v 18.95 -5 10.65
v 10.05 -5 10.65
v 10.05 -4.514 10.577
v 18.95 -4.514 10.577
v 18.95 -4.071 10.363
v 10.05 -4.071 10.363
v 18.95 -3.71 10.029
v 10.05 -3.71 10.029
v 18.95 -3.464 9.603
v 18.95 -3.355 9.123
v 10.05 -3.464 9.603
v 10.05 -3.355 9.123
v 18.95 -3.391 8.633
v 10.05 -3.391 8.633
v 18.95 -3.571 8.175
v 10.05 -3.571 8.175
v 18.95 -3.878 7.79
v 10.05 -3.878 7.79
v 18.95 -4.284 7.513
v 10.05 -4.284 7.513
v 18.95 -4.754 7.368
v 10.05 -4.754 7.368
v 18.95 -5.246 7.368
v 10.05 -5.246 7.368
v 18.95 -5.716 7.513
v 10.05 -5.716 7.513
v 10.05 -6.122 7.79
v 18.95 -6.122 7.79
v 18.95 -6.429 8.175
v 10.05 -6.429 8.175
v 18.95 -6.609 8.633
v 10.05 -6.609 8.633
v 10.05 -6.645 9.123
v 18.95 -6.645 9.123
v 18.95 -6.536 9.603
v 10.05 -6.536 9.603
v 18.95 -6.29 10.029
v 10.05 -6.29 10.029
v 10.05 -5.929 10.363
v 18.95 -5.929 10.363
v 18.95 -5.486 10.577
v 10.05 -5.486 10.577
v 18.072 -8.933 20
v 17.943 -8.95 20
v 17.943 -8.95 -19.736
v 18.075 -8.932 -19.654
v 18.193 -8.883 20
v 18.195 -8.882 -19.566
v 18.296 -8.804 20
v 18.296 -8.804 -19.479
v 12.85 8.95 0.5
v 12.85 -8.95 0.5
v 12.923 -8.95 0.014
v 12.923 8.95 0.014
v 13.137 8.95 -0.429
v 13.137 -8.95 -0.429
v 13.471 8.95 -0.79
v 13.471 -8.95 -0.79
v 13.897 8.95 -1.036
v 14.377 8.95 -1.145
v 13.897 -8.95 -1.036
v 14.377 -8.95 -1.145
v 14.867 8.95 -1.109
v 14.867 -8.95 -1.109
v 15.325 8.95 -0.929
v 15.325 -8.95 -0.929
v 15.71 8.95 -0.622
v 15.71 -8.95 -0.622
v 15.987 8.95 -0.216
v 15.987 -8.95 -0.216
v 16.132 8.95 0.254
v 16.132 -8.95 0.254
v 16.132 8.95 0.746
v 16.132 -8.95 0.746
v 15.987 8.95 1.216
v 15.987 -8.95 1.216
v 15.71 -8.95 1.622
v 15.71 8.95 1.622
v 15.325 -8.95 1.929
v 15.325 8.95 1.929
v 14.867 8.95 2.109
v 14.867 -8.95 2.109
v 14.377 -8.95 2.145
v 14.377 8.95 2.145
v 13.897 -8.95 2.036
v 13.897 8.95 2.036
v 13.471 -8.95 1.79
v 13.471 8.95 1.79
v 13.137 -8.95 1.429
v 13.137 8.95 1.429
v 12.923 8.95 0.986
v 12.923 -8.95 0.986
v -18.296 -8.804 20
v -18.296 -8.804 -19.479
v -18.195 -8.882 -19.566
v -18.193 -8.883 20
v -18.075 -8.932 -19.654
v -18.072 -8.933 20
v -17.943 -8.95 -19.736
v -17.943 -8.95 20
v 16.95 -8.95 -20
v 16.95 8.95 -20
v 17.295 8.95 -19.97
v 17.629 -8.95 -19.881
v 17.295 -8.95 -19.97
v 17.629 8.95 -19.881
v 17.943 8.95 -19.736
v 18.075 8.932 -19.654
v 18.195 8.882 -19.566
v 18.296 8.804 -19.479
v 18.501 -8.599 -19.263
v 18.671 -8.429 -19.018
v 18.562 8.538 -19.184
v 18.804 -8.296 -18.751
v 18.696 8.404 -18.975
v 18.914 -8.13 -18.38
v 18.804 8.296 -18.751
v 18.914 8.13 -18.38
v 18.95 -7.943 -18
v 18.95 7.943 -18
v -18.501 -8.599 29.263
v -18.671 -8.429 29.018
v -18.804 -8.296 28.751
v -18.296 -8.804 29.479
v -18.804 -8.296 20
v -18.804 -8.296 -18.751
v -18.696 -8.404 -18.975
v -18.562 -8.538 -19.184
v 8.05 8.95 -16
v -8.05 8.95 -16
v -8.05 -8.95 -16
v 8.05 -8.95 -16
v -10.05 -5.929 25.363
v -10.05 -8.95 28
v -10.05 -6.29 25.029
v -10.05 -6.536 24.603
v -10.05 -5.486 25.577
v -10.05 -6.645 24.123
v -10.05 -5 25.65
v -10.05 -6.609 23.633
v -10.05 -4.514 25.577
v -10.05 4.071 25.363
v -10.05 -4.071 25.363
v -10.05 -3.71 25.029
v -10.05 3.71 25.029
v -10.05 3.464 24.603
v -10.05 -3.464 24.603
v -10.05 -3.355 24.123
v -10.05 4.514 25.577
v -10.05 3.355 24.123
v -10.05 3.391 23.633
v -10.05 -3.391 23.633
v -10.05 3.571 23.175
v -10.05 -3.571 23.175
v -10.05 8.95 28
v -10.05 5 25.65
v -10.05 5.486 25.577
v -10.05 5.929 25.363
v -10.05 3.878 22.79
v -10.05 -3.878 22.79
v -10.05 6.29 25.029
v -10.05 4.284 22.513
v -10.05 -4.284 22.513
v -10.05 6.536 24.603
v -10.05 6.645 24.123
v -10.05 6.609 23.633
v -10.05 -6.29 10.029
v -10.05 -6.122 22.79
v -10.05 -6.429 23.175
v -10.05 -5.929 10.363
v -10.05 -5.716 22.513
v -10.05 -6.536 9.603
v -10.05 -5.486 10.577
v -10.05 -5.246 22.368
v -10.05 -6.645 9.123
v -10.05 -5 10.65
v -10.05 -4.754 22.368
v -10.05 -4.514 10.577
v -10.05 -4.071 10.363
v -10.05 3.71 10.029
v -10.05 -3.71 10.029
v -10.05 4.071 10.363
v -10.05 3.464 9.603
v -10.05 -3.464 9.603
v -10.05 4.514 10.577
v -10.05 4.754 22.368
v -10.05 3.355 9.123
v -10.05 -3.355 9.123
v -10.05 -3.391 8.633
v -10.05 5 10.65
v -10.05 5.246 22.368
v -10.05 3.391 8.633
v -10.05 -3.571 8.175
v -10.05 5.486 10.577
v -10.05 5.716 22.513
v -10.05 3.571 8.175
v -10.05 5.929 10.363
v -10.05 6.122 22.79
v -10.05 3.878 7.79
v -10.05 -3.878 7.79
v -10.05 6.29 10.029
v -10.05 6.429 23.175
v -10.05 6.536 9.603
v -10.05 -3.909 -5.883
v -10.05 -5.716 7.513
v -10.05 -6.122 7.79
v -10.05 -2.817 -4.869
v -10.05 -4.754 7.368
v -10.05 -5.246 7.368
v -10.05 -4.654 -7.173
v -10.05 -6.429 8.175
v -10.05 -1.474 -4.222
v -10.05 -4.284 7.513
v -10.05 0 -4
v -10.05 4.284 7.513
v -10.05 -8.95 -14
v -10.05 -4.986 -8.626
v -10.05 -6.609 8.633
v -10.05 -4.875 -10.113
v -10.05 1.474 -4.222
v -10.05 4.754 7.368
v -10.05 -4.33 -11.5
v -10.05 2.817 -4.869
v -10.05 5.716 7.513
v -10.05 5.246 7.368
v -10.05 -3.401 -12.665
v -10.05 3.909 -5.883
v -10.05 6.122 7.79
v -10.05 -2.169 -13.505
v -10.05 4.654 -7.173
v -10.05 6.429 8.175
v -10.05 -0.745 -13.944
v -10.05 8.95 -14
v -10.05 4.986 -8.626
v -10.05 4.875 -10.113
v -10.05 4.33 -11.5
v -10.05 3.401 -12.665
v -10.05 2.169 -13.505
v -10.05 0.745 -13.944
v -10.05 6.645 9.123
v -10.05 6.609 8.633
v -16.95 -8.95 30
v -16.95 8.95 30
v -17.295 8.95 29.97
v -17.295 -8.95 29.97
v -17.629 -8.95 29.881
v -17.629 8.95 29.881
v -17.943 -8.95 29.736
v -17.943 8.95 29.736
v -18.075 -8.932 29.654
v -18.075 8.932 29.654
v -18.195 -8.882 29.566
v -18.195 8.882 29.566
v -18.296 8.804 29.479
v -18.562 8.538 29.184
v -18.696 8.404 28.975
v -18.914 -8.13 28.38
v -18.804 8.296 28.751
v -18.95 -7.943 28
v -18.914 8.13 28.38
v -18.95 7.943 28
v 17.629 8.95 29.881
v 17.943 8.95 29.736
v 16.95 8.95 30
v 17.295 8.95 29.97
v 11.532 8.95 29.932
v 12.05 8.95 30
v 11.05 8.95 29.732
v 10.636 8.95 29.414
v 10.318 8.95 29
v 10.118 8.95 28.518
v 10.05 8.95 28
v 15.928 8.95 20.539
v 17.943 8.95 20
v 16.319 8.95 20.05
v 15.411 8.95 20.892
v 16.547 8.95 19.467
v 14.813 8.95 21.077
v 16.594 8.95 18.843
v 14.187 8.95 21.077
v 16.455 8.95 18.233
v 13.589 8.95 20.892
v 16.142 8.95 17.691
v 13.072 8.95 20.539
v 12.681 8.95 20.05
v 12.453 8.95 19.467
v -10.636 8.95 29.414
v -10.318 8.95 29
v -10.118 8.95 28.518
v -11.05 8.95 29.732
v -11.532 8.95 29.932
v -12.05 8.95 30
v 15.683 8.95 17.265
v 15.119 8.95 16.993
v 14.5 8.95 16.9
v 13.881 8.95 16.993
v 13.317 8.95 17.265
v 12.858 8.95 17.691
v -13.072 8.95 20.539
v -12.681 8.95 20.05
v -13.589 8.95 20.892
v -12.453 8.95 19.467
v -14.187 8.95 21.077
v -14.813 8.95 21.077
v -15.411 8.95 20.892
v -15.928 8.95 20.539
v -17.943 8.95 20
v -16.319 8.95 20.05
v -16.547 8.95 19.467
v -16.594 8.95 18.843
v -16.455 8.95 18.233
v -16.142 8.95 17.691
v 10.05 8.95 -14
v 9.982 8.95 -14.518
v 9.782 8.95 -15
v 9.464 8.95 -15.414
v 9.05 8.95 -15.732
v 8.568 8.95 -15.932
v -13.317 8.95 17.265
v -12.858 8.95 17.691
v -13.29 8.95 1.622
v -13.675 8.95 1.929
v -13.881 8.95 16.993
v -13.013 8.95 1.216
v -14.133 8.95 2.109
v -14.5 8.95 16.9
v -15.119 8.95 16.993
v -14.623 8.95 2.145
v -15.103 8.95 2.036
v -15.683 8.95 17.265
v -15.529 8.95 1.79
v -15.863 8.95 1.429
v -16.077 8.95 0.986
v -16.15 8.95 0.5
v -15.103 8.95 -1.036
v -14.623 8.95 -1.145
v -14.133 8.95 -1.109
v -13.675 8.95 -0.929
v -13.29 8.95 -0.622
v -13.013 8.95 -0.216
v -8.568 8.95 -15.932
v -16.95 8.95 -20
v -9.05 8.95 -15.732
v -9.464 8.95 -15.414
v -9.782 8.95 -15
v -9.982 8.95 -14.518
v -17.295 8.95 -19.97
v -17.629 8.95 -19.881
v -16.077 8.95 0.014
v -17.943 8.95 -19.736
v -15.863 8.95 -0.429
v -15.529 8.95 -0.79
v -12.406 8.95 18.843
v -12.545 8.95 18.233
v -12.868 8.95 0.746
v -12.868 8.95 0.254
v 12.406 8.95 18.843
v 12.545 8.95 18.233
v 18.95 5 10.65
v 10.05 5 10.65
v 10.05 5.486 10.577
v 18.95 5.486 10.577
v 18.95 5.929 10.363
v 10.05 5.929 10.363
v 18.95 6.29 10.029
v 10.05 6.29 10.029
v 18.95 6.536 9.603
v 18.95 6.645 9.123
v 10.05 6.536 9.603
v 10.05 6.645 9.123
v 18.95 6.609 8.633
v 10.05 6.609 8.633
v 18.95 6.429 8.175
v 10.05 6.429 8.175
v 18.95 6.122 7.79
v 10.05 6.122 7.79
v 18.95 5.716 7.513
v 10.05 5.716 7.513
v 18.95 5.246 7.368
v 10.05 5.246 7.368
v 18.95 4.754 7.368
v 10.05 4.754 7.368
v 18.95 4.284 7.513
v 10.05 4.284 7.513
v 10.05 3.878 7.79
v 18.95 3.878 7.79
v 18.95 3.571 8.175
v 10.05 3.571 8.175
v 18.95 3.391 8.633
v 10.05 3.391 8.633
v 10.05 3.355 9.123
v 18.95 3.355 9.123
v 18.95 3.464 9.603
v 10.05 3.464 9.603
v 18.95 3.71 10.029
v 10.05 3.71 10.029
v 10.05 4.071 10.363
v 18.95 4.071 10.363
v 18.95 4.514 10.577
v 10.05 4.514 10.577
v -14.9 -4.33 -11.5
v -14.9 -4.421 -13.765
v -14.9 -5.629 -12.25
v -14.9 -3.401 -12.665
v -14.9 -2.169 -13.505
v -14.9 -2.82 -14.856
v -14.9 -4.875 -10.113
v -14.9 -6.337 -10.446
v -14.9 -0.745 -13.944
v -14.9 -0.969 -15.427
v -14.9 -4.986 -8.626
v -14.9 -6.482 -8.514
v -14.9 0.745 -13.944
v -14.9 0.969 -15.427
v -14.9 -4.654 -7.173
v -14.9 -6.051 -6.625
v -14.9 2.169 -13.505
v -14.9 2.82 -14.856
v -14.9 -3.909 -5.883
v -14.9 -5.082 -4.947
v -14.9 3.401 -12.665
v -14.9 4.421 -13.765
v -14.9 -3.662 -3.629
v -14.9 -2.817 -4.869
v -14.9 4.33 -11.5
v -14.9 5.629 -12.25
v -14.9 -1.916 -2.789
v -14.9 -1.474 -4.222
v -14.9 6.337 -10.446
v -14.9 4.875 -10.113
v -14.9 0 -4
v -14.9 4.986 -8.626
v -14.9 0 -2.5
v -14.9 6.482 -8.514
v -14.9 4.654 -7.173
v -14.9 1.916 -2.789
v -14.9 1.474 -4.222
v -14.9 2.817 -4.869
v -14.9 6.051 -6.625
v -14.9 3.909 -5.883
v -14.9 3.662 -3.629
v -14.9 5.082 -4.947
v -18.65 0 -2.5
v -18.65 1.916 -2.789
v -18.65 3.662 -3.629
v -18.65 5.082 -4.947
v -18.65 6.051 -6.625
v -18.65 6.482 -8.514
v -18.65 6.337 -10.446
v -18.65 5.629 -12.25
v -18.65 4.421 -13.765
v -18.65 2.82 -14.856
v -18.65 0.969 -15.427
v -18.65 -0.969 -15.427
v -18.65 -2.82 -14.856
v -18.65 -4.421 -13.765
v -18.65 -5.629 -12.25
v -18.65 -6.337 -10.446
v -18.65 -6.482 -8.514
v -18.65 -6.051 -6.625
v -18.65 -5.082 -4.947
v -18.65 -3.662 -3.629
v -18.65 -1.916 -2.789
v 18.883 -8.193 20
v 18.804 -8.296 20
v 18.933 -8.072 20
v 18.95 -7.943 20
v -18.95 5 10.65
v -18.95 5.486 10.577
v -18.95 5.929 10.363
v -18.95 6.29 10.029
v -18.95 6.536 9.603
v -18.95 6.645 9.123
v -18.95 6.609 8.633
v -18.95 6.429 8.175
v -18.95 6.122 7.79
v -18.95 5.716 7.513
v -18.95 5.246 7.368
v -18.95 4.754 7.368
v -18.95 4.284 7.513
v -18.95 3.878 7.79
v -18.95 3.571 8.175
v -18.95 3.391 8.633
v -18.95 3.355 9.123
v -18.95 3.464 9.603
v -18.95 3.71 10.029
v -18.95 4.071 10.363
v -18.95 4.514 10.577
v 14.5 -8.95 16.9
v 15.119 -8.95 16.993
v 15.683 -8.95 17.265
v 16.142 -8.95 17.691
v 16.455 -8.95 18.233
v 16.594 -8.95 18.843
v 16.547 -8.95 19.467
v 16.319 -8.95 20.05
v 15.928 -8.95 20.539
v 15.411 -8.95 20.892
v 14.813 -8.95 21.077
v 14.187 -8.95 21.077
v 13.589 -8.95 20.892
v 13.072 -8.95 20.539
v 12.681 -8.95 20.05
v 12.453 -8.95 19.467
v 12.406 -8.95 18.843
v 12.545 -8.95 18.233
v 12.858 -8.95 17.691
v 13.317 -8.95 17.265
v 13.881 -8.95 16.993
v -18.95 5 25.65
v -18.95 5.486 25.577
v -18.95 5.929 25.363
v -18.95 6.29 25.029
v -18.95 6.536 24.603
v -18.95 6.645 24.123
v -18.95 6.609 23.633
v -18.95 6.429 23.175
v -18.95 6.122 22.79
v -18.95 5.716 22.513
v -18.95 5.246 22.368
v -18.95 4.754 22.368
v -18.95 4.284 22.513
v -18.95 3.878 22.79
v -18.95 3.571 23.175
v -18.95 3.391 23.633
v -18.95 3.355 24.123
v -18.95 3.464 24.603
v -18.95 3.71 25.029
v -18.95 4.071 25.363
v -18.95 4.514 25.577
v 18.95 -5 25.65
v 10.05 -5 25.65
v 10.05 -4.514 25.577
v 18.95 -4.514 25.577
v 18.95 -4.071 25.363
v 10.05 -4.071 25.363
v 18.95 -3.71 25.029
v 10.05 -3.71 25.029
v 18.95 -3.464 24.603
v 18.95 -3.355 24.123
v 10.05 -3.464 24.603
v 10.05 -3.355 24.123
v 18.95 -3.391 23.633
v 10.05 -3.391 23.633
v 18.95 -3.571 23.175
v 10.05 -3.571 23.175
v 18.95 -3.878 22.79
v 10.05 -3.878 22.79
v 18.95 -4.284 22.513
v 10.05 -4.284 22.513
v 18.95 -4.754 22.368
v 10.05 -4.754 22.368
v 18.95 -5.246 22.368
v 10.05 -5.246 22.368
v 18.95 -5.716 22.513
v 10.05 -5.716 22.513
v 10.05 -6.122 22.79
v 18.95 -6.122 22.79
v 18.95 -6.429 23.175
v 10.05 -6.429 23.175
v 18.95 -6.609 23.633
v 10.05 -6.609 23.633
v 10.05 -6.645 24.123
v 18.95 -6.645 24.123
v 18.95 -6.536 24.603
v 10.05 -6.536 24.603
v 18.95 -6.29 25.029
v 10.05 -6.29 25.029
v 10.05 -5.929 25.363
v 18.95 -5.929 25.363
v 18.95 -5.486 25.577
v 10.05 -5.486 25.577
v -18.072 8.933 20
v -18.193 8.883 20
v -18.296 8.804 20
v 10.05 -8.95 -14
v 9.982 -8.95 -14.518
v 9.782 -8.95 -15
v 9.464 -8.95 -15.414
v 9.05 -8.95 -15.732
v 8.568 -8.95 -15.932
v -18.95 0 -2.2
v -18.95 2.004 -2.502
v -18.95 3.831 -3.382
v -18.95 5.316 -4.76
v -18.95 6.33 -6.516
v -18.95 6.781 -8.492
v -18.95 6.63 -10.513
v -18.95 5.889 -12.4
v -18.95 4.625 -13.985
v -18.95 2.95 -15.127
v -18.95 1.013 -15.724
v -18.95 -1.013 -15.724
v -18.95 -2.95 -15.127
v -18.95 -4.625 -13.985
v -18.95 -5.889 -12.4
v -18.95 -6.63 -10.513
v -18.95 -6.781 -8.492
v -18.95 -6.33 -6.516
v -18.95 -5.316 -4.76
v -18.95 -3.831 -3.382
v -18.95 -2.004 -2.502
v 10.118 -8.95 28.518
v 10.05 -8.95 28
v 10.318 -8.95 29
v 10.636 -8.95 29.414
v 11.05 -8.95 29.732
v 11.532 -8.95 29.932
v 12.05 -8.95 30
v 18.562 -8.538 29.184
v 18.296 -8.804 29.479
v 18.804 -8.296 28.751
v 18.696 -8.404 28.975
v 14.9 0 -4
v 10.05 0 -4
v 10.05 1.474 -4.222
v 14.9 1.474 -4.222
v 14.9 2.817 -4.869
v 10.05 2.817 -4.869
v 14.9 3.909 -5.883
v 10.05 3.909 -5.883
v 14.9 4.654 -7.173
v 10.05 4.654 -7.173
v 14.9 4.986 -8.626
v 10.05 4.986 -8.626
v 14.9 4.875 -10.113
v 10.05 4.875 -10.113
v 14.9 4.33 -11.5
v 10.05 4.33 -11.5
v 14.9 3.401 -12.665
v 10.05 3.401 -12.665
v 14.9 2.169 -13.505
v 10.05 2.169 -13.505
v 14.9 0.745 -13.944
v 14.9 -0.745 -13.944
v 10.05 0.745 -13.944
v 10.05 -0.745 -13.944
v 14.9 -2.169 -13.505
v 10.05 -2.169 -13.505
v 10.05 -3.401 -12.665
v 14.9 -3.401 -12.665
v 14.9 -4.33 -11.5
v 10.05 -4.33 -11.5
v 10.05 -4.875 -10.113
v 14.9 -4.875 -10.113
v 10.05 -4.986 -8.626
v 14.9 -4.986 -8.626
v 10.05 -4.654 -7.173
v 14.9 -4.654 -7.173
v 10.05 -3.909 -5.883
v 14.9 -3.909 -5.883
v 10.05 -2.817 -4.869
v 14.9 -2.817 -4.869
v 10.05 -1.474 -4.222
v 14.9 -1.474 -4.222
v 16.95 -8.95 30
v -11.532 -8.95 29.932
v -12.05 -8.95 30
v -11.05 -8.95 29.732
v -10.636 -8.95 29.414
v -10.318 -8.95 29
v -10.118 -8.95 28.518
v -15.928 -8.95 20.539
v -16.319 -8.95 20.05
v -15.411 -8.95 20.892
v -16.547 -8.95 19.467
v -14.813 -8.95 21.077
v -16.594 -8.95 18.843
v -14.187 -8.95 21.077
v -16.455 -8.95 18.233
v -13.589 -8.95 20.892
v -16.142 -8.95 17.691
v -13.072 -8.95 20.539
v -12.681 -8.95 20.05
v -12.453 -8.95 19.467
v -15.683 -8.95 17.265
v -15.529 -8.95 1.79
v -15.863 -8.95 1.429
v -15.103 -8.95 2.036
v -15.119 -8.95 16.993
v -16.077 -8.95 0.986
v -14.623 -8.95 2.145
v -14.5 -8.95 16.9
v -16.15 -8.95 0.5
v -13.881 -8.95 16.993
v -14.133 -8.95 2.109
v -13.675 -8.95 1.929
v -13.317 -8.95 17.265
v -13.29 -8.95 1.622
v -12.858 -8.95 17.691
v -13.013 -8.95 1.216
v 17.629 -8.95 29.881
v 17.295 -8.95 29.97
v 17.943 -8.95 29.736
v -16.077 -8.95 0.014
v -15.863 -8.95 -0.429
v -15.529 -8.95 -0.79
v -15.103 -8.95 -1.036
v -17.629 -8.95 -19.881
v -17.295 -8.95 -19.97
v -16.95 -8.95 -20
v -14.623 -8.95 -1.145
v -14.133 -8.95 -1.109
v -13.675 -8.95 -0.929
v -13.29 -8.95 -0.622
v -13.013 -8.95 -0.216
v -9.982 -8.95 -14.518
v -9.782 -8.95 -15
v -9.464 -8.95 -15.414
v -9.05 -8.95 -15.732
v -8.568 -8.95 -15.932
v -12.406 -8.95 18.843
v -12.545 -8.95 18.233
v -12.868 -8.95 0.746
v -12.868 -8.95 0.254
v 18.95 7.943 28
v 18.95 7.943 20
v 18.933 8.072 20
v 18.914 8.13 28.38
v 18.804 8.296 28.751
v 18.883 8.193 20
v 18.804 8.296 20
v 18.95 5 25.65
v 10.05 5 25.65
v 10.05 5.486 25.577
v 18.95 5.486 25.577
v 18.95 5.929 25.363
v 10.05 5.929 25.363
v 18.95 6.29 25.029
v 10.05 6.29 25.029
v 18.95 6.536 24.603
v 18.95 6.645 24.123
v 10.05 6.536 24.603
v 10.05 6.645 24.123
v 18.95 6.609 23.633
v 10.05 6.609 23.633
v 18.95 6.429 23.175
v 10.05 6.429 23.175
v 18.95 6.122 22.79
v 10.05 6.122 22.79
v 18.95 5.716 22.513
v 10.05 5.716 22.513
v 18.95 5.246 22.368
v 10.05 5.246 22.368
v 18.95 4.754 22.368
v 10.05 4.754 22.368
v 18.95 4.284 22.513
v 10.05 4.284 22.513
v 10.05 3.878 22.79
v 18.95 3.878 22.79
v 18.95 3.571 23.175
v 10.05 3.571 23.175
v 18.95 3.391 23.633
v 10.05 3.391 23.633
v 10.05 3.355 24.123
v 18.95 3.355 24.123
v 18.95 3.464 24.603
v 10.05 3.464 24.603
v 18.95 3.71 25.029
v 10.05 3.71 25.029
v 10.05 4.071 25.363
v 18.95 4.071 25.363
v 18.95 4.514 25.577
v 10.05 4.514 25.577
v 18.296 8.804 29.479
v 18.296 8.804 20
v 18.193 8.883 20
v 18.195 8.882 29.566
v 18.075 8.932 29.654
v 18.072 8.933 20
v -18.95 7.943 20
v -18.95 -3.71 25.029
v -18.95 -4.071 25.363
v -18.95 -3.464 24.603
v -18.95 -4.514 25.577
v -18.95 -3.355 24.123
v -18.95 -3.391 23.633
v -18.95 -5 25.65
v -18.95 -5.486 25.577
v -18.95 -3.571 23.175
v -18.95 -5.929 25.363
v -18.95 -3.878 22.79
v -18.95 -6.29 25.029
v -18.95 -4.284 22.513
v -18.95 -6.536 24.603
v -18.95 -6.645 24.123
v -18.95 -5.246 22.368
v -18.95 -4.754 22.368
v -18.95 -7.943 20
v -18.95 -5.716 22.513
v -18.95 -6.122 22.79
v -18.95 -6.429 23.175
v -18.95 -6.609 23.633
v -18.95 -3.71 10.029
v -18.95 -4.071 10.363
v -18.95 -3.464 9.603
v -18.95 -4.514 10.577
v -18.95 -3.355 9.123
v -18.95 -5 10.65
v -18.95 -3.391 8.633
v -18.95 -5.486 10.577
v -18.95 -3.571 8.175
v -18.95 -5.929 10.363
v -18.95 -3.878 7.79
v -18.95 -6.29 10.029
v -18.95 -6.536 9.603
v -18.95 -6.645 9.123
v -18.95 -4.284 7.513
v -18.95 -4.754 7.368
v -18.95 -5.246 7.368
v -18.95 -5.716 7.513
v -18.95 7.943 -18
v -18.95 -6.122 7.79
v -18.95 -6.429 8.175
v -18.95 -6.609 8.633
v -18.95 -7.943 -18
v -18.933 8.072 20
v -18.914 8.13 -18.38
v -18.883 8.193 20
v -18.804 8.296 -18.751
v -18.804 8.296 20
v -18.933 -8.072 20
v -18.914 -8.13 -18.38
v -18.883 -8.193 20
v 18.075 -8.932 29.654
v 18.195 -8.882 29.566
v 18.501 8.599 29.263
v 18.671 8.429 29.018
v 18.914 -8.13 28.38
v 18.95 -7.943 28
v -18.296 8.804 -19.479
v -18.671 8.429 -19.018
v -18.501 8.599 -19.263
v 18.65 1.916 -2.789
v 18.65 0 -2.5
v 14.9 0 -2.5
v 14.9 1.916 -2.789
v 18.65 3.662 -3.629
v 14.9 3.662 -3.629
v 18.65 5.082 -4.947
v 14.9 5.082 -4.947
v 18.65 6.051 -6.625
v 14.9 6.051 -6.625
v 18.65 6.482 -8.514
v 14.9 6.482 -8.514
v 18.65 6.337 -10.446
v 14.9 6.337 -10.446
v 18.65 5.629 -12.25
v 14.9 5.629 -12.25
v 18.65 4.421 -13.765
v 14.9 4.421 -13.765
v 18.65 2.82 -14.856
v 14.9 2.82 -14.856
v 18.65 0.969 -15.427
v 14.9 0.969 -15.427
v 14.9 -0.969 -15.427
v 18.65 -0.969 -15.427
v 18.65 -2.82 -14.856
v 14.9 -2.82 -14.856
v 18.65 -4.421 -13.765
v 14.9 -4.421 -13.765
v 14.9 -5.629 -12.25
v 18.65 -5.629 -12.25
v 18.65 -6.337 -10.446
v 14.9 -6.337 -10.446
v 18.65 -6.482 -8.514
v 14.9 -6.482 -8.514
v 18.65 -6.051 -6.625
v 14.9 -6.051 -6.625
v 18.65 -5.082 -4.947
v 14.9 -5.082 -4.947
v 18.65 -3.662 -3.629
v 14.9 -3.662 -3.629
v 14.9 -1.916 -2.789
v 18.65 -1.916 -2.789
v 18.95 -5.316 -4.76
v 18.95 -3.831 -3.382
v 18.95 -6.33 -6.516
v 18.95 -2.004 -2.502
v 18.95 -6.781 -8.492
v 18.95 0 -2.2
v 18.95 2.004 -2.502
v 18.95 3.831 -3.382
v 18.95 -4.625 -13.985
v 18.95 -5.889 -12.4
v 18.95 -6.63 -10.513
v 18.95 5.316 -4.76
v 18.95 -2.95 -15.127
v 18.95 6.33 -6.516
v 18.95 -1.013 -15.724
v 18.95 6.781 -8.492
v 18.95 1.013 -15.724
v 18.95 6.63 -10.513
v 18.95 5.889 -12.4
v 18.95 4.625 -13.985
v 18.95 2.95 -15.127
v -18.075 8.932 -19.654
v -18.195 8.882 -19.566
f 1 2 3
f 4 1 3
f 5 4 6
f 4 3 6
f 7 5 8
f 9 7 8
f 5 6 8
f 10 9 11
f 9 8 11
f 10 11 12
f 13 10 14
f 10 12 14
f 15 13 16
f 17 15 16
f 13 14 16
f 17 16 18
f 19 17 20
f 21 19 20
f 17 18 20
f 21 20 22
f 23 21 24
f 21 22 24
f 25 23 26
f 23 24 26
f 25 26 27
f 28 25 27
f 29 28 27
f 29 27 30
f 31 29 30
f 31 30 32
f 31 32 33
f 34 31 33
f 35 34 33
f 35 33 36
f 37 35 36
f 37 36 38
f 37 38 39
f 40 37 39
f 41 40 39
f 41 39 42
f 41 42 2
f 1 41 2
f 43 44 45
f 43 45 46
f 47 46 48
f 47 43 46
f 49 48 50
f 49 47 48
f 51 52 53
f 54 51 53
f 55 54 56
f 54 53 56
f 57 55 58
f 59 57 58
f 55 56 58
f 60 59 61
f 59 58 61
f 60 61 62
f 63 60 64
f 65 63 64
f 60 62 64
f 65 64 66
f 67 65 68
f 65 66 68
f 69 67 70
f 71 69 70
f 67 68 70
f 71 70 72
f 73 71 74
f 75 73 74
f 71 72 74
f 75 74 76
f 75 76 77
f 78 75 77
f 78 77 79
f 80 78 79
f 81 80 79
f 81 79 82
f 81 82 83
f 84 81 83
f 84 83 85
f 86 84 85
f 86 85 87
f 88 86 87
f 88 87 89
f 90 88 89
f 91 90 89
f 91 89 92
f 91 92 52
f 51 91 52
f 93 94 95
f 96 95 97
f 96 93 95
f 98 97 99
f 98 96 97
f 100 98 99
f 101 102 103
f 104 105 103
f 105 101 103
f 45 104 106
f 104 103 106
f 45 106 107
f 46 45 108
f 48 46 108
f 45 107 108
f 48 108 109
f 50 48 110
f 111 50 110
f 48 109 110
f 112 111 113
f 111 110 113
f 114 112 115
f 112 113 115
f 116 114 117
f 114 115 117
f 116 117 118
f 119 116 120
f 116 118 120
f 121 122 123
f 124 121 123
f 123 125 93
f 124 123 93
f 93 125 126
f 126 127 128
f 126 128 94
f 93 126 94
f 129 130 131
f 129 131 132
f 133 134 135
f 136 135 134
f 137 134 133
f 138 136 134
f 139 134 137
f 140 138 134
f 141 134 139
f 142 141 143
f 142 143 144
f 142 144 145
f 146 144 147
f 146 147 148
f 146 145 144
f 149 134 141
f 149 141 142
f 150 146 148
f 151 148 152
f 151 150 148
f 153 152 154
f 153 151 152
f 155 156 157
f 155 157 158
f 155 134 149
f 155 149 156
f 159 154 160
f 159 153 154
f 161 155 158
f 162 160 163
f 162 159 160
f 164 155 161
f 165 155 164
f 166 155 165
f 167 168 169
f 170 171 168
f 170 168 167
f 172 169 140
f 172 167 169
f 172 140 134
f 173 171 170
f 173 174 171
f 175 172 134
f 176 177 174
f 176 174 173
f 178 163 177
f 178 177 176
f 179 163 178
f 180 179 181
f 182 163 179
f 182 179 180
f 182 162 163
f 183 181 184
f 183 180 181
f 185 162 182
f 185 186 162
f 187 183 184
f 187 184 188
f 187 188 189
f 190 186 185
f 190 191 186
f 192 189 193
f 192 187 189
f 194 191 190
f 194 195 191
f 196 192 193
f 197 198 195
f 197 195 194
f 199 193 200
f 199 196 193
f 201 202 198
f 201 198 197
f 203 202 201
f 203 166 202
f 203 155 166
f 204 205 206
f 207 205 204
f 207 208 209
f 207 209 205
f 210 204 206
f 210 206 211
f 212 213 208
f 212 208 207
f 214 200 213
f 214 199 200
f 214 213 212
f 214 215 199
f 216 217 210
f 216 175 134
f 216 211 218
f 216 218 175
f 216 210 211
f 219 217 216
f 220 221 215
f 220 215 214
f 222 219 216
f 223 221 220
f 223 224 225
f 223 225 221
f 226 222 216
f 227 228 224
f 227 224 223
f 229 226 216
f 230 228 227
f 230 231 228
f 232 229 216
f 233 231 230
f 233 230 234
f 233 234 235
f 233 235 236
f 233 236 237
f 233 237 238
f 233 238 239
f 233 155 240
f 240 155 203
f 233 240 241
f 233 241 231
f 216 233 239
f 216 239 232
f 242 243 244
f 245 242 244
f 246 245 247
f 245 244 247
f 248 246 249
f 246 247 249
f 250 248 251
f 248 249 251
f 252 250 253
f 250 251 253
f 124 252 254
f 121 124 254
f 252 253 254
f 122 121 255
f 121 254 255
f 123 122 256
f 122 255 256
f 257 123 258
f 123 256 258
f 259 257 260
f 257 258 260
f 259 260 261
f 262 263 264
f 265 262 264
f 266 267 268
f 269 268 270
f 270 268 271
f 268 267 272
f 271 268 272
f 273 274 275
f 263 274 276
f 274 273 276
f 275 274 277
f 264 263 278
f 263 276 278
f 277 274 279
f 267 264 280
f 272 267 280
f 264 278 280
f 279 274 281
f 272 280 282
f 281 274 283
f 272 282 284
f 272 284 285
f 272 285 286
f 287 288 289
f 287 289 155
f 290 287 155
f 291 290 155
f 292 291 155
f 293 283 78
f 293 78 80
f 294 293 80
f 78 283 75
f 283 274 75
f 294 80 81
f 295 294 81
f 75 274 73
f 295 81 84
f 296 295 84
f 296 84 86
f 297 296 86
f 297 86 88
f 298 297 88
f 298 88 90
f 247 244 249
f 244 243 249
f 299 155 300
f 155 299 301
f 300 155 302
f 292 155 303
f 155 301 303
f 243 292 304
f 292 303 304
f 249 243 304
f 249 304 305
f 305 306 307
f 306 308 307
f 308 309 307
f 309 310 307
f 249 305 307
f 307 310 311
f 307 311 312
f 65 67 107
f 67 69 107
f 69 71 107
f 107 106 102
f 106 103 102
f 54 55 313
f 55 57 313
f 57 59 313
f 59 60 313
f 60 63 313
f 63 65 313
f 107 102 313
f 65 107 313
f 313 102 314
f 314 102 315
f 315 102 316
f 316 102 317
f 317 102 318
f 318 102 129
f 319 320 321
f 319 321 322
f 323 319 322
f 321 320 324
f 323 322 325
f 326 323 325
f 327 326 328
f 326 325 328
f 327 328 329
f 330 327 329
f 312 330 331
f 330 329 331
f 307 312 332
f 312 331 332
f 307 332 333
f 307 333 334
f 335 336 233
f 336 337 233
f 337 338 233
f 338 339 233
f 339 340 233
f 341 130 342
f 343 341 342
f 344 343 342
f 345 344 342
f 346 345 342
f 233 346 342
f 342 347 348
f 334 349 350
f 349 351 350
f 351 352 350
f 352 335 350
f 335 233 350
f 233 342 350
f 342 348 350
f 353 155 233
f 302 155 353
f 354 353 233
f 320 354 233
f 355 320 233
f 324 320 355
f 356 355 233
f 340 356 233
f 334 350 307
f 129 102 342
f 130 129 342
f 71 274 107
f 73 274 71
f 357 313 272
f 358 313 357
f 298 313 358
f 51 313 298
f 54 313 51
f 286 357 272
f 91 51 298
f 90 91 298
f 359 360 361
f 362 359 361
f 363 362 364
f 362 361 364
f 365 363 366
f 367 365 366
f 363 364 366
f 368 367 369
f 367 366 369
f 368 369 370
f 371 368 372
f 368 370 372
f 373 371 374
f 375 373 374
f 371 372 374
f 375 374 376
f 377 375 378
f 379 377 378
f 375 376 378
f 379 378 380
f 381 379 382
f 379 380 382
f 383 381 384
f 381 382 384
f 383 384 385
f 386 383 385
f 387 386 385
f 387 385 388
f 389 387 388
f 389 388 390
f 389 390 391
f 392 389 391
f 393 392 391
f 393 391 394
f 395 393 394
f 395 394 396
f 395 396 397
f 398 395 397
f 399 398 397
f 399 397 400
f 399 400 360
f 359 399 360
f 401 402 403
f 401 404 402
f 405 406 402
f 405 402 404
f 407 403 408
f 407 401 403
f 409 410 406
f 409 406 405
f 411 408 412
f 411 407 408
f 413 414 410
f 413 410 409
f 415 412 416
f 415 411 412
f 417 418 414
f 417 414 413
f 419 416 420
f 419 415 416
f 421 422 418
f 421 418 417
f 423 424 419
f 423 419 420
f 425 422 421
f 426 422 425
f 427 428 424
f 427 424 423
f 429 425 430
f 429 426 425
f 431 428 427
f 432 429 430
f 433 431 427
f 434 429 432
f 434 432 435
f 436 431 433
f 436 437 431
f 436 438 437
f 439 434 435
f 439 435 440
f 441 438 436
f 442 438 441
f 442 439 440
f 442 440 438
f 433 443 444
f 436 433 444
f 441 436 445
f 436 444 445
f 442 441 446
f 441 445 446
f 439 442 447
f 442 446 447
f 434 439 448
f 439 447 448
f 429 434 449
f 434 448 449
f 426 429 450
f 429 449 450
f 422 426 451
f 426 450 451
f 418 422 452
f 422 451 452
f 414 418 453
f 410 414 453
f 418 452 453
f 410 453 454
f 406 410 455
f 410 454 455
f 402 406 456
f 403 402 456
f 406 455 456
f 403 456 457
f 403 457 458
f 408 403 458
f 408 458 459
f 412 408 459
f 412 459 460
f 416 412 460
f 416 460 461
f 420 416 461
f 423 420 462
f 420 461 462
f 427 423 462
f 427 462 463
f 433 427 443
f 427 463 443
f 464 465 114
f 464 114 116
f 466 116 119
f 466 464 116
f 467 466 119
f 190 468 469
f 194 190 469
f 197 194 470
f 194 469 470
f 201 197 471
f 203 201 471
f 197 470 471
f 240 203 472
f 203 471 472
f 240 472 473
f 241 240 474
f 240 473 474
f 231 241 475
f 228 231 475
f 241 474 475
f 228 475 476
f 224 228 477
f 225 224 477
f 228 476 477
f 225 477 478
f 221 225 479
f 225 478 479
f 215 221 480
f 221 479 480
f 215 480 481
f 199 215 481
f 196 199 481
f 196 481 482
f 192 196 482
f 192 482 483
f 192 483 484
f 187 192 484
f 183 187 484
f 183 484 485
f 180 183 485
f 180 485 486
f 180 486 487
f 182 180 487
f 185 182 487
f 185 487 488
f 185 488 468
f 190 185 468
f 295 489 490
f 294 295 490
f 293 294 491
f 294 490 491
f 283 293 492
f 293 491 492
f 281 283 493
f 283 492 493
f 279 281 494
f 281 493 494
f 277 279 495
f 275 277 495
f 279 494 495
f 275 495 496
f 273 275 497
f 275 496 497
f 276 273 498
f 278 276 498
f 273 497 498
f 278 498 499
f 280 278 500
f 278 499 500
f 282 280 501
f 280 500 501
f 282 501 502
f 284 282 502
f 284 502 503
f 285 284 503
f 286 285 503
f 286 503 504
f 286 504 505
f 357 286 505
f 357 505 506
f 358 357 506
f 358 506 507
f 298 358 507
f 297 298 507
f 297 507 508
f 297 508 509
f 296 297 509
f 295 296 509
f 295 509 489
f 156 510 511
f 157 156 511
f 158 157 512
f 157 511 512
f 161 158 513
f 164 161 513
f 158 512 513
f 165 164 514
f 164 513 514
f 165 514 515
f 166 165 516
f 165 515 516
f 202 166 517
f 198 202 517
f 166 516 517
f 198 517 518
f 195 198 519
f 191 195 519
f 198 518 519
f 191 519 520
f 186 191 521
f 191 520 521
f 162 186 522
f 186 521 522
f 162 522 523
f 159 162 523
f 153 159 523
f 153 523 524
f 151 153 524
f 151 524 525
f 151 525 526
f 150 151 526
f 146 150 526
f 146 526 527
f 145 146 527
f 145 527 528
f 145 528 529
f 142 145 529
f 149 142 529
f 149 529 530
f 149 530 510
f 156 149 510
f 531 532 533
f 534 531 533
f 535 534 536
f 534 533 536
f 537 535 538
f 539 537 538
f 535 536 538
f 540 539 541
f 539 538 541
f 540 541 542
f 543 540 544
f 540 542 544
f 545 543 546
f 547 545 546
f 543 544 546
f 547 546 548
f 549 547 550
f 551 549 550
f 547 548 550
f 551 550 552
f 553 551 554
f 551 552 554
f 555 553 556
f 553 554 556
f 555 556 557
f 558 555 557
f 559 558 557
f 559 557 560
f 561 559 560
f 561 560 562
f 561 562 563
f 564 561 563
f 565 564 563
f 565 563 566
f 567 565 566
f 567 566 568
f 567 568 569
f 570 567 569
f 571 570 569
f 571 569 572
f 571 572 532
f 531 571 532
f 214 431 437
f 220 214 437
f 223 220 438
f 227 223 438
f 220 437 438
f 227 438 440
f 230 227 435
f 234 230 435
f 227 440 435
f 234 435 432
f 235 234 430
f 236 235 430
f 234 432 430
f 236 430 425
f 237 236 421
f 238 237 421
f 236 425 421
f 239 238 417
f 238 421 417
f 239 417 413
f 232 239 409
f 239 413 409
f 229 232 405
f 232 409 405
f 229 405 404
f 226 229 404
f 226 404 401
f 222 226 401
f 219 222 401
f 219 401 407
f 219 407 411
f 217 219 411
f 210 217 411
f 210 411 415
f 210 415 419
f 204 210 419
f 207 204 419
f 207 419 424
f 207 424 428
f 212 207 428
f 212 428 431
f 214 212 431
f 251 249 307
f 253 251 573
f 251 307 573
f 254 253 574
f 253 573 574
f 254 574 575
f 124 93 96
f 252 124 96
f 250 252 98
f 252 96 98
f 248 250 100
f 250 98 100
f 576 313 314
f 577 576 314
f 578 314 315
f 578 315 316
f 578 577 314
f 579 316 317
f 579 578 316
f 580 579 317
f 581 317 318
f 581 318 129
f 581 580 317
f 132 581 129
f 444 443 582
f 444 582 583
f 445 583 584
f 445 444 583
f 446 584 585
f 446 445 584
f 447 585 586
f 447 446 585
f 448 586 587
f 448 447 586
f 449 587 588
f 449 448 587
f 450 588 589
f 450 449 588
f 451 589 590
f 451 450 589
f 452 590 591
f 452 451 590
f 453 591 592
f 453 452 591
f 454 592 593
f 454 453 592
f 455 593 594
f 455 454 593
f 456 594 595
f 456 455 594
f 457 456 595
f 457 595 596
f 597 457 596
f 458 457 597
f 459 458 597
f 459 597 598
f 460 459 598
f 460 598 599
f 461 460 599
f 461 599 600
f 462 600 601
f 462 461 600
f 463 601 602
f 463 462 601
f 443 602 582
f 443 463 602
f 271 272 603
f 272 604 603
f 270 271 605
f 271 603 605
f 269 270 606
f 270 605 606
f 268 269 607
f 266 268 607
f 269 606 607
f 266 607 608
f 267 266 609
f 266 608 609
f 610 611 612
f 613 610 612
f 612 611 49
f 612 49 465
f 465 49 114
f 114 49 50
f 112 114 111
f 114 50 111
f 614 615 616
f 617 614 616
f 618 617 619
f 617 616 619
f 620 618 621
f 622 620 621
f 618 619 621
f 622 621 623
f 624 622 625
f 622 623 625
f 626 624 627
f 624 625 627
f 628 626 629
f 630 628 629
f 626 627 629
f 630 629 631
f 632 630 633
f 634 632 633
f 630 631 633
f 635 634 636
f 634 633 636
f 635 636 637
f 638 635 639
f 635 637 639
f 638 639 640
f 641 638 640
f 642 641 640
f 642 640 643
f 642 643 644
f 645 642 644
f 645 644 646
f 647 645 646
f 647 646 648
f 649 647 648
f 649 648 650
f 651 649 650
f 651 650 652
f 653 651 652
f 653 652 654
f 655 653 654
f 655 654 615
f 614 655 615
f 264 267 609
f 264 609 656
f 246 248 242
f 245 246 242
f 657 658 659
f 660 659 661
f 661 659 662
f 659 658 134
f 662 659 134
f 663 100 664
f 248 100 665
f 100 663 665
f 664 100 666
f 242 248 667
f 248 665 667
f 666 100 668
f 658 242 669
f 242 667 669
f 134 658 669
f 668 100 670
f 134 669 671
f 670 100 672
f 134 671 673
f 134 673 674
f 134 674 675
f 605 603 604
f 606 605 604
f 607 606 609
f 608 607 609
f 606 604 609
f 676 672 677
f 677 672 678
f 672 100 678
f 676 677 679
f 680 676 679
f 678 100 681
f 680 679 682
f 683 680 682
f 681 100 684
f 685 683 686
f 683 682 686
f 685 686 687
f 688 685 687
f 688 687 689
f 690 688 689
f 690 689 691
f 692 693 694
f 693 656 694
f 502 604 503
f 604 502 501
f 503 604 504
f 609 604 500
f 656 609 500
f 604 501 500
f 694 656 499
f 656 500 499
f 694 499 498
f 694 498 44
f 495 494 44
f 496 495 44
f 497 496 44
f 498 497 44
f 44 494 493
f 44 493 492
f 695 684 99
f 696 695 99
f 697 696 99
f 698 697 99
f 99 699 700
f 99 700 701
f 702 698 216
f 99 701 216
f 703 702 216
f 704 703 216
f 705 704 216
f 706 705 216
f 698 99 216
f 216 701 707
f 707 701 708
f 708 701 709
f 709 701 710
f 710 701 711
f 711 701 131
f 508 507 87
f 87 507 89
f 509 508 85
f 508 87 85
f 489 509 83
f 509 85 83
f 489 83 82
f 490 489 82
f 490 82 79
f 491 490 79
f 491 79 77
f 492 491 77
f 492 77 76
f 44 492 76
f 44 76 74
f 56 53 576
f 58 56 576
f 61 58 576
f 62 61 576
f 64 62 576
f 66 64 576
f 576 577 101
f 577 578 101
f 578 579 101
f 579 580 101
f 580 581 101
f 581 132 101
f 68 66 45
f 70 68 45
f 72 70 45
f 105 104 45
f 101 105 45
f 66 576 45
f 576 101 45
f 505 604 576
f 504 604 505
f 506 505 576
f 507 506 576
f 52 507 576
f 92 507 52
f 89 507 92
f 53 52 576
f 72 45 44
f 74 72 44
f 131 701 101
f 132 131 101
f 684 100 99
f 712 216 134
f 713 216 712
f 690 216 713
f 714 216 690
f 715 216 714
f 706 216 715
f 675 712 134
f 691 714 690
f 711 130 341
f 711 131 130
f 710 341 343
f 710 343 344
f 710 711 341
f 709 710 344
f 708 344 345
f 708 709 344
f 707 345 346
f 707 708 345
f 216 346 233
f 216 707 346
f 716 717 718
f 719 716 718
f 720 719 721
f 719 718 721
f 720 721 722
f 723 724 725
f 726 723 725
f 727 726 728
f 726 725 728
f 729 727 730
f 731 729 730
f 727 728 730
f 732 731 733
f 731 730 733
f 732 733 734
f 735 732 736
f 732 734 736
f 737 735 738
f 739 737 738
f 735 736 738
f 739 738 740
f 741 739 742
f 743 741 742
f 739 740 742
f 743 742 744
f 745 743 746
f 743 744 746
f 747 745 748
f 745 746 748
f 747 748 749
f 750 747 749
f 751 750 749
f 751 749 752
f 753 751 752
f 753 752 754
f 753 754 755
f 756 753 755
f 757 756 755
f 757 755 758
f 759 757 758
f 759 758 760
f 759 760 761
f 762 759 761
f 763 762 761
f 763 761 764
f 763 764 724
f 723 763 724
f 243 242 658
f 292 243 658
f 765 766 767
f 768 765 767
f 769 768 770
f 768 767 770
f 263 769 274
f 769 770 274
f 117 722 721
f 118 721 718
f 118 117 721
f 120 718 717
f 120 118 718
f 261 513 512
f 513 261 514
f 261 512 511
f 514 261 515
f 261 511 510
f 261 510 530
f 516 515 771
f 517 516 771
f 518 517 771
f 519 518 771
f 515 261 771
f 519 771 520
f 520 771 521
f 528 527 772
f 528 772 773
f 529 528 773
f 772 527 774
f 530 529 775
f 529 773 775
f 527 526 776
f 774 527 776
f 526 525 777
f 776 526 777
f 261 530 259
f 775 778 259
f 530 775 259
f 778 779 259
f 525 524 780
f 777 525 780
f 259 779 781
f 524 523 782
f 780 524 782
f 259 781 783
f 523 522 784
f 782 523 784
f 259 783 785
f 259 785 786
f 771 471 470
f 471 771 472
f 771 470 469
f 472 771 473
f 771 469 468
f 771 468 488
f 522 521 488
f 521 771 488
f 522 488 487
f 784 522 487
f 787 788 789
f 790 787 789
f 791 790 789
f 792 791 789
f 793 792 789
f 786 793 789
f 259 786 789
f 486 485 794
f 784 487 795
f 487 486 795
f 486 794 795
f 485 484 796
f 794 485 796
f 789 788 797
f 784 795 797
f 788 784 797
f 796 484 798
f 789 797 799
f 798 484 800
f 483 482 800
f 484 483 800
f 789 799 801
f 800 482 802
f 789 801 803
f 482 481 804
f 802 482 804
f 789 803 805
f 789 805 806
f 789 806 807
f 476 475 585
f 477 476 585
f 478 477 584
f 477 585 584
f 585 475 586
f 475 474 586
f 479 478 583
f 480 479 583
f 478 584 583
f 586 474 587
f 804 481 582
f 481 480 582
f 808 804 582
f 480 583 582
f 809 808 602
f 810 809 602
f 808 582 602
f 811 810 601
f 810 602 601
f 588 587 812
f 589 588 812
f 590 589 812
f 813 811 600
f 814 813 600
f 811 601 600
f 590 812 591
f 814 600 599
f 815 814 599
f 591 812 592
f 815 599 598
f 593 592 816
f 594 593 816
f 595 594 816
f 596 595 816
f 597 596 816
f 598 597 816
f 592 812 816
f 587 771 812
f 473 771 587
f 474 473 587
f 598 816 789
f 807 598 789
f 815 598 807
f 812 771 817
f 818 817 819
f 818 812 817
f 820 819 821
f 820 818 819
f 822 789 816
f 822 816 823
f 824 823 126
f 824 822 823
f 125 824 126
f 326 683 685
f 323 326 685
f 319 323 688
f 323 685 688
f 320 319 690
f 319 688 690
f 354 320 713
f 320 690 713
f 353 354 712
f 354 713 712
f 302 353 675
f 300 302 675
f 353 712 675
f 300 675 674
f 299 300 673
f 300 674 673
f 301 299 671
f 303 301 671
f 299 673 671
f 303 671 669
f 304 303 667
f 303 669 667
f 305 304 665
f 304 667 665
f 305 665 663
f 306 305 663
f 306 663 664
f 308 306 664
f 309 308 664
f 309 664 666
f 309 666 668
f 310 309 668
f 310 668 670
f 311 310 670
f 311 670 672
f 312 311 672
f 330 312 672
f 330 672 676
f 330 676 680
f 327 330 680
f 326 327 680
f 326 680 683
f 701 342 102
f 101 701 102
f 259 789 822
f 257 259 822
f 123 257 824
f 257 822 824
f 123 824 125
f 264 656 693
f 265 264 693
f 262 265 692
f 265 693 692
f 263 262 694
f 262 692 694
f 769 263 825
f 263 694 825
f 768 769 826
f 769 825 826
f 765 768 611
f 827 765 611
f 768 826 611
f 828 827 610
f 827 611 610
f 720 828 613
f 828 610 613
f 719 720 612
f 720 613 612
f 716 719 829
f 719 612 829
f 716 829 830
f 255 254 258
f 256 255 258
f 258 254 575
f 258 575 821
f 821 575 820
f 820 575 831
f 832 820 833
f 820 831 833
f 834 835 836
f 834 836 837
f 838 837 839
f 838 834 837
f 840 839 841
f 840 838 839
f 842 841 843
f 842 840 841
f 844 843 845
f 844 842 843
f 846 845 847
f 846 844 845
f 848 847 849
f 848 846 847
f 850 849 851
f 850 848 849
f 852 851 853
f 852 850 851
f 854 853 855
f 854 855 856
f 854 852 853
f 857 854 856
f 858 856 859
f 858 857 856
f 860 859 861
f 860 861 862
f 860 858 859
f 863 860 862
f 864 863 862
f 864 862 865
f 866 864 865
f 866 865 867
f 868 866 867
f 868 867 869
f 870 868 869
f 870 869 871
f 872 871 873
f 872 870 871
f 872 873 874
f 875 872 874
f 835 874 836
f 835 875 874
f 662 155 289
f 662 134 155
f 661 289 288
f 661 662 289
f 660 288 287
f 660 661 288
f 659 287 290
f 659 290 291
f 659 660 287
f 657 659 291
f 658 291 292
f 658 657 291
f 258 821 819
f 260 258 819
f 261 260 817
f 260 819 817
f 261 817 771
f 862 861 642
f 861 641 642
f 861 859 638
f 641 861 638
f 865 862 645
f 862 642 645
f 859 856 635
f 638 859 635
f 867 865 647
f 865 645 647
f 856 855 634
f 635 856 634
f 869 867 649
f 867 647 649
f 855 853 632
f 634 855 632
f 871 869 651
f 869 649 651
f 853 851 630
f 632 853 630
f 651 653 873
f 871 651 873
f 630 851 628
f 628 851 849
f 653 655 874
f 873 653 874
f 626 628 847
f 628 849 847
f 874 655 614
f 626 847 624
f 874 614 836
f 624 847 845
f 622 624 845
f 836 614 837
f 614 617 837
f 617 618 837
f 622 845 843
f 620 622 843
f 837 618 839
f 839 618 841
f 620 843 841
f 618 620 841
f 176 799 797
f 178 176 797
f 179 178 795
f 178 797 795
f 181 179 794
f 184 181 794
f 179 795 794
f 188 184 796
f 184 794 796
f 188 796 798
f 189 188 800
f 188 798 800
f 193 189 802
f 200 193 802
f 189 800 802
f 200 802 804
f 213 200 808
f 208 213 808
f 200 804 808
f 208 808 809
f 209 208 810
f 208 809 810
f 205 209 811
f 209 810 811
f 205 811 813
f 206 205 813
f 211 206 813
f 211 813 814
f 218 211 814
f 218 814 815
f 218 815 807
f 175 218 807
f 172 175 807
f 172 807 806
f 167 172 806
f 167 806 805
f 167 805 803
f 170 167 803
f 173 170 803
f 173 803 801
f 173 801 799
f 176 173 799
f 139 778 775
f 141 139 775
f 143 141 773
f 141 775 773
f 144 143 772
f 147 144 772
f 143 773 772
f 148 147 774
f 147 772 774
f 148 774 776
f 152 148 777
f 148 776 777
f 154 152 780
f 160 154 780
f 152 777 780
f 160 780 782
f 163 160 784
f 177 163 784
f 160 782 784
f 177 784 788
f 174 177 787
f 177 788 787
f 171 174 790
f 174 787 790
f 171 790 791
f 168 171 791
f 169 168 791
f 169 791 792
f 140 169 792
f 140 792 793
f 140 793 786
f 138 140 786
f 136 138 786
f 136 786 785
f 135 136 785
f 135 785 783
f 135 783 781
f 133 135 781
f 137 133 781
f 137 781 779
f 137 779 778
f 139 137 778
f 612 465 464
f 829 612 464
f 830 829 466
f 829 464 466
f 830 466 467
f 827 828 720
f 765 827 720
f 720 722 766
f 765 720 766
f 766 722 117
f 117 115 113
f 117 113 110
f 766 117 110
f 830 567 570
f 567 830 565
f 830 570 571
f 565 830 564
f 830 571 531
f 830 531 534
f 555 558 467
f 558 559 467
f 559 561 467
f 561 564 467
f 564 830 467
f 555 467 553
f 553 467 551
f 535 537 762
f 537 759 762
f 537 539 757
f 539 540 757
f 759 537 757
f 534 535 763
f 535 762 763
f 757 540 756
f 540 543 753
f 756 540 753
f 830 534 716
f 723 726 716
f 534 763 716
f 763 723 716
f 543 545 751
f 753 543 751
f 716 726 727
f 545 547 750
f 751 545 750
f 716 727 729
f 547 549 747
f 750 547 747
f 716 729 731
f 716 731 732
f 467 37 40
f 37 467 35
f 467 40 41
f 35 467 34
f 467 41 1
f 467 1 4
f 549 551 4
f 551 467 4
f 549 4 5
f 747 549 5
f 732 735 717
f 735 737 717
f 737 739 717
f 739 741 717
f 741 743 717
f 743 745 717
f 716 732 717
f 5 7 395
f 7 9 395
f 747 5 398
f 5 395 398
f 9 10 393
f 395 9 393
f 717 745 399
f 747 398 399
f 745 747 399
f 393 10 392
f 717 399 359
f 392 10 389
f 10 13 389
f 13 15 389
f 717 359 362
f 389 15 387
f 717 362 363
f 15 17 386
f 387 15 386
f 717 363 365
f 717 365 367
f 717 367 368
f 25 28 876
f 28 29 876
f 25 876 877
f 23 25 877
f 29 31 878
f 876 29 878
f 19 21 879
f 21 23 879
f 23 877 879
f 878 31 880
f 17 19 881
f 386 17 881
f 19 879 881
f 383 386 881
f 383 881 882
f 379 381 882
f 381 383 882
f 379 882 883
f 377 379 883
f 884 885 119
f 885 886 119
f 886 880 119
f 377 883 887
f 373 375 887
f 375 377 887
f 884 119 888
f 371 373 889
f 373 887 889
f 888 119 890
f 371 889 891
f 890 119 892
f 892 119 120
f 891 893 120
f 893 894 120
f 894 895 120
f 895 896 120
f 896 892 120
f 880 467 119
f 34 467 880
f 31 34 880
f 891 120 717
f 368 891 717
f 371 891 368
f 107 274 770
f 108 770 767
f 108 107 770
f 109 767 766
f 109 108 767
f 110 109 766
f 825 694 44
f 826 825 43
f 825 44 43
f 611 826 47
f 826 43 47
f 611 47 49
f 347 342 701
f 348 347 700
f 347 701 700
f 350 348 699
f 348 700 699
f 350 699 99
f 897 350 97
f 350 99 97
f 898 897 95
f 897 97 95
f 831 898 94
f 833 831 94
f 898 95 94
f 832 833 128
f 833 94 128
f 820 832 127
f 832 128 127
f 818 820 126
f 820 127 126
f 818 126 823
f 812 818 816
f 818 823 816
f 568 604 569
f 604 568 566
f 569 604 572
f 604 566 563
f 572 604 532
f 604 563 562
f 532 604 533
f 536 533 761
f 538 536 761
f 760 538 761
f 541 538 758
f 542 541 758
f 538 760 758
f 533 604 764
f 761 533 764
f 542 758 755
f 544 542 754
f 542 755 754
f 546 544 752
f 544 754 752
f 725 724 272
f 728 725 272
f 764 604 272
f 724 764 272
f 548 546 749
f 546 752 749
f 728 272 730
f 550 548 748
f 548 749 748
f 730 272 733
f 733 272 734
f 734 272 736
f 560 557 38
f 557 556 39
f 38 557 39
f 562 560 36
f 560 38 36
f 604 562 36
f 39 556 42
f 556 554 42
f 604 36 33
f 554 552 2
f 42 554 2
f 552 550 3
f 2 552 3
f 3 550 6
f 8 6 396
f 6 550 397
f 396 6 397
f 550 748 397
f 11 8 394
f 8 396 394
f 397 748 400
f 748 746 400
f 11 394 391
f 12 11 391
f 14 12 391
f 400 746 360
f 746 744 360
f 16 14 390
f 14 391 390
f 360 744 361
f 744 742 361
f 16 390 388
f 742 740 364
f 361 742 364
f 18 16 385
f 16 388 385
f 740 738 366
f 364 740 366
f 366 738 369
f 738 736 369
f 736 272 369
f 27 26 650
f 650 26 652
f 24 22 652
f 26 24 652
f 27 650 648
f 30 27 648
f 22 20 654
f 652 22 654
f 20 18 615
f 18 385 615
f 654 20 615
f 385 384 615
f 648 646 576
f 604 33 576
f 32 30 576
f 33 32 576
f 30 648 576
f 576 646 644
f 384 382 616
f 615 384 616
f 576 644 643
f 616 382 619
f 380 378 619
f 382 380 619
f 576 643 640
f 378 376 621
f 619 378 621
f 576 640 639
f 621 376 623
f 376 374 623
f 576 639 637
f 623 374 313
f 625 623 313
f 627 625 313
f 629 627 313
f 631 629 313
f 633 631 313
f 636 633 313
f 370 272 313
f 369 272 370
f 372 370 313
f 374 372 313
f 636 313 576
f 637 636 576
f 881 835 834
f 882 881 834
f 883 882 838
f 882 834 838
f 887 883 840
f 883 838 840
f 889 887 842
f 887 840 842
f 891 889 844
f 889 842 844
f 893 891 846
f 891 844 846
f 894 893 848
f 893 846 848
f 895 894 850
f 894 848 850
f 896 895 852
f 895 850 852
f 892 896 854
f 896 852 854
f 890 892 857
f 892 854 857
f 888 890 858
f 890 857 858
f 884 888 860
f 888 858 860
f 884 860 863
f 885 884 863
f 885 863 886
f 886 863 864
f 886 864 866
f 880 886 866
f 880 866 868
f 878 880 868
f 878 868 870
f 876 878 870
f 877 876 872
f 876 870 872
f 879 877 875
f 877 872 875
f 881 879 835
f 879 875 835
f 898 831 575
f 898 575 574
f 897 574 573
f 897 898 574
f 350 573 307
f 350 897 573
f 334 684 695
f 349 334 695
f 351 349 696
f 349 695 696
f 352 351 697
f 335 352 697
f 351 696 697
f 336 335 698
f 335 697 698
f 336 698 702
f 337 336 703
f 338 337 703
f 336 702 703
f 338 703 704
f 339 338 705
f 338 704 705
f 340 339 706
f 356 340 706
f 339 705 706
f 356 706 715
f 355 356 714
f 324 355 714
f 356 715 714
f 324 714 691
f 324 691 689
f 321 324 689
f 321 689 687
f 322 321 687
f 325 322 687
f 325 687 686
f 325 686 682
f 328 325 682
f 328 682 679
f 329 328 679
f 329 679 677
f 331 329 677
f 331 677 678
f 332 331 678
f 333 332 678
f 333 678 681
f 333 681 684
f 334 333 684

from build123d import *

# Parameters (mm, degrees)
SKETCH_1_W             = 37.9
SKETCH_1_H             = 17.9
EXTRUDE_1_DEPTH        = 20
CHAMFER_1_SIZE         = 0.8
FILLET_1_R             = 0.5
SKETCH_2_R             = 6.5
CUT_EXTRUDE_1_DEPTH    = 4.05
SKETCH_3_R             = 5
CUT_EXTRUDE_2_DEPTH    = 64
CHAMFER_2_SIZE         = 0.3
HOLE_WIZARD_M4_1_D     = 3.3
HOLE_WIZARD_M4_1_DEPTH = 20
HOLE_WIZARD_M4_1_TIP   = 0.991420021
HOLE_WIZARD_M4_2_D     = 3.3
HOLE_WIZARD_M4_2_DEPTH = 42.1
HOLE_WIZARD_M4_2_TIP   = 0.991420021
EXTRUDE_2_DEPTH        = 10
SKETCH_17_W            = 20.1
SKETCH_17_H            = 46
CUT_EXTRUDE_5_DEPTH    = 25
FILLET_2_R             = 2
SKETCH_18_R            = 2.1
CUT_EXTRUDE_6_DEPTH    = 35
FILLET_4_R             = 2
HOLE_WIZARD_M4_4_D     = 3.3
HOLE_WIZARD_M4_4_DEPTH = 42.1
HOLE_WIZARD_M4_4_TIP   = 0.991420021


# Some blends are built 0.0001 mm under size
with BuildPart() as part:
    # 草图1 → 凸台-拉伸1 (new, symmetric)
    with BuildSketch(Plane.XY):
        Rectangle(SKETCH_1_W, SKETCH_1_H)
    extrude(amount=EXTRUDE_1_DEPTH, both=True)

    # 倒角1
    chamfer_1_edges = [part.edges().sort_by_distance(p)[0] for p in [
        (-18.95, -8.95, 0),
        (-18.95, 8.95, 0),
        (18.95, 8.95, 0),
        (18.95, -8.95, 0),
    ]]
    chamfer(chamfer_1_edges, length=CHAMFER_1_SIZE)

    # 圆角1
    fillet_1_edges = [part.edges().sort_by_distance(p)[0] for p in [
        (18.15, -8.95, 0),
        (-18.15, -8.95, 0),
        (-18.95, 8.15, 0),
        (-18.95, -8.15, 0),
        (18.95, 8.15, 0),
        (18.95, -8.15, 0),
        (18.15, 8.95, 0),
        (-18.15, 8.95, 0),
    ]]
    fillet(fillet_1_edges, radius=FILLET_1_R)

    # 草图2 → 切除-拉伸1 (cut)
    with BuildSketch(Plane.ZY.offset(18.95)):
        with Locations((-9, 0)):
            Circle(SKETCH_2_R)
    cut_extrude_1 = extrude(amount=-CUT_EXTRUDE_1_DEPTH, mode=Mode.SUBTRACT)

    # 草图3 → 切除-拉伸2 (cut)
    with BuildSketch(Plane.ZY.offset(14.9)):
        with Locations((-9, 0)):
            Circle(SKETCH_3_R)
    extrude(amount=-CUT_EXTRUDE_2_DEPTH, mode=Mode.SUBTRACT)

    # 镜向1: 切除-拉伸1 across plane
    add(cut_extrude_1.mirror(Plane(origin=(0, 0, 0), x_dir=(0, 0, 1), z_dir=(1, 0, 0))), mode=Mode.SUBTRACT)

    # 倒角2
    chamfer_2_edges = [part.edges().sort_by_distance(p)[0] for p in [
        (-18.95, 0, -15.5),
        (18.95, 0, -15.5),
    ]]
    chamfer(chamfer_2_edges, length=CHAMFER_2_SIZE)

    # M4 螺纹孔1
    with Locations(Plane(origin=(0, 8.95, 0), x_dir=(1, 0, 0), z_dir=(0, 1, 0))):
        with Locations((-14.5, -0.5), (14.5, -0.5)):
            Hole(HOLE_WIZARD_M4_1_D / 2, depth=HOLE_WIZARD_M4_1_DEPTH)
            with Locations((0, 0, -(HOLE_WIZARD_M4_1_DEPTH + HOLE_WIZARD_M4_1_TIP / 2))):  # 118° drill point
                Cone(0, HOLE_WIZARD_M4_1_D / 2, HOLE_WIZARD_M4_1_TIP, mode=Mode.SUBTRACT)

    # M4 螺纹孔2
    with Locations(Plane(origin=(18.95, 0, 0), x_dir=(0, 0, -1), z_dir=(1, 0, 0))):
        with Locations((-9, 5), (-9, -5)):
            Hole(HOLE_WIZARD_M4_2_D / 2, depth=HOLE_WIZARD_M4_2_DEPTH)
            with Locations((0, 0, -(HOLE_WIZARD_M4_2_DEPTH + HOLE_WIZARD_M4_2_TIP / 2))):  # 118° drill point
                Cone(0, HOLE_WIZARD_M4_2_D / 2, HOLE_WIZARD_M4_2_TIP, mode=Mode.SUBTRACT)

    # 草图13 → 凸台-拉伸2 (add)
    with BuildSketch(Plane.XY.offset(20)):
        with BuildLine():
            Line((-17.942893219, -8.95), (17.942893219, -8.95))
            ThreePointArc((17.942893219, -8.95), (18.134234935, -8.911939766), (18.296446609, -8.803553391))
            Line((18.296446609, -8.803553391), (18.803553391, -8.296446609))
            ThreePointArc((18.803553391, -8.296446609), (18.911939766, -8.134234935), (18.95, -7.942893219))
            Line((18.95, -7.942893219), (18.95, 7.942893219))
            ThreePointArc((18.95, 7.942893219), (18.911939766, 8.134234935), (18.803553391, 8.296446609))
            Line((18.803553391, 8.296446609), (18.296446609, 8.803553391))
            ThreePointArc((18.296446609, 8.803553391), (18.134234935, 8.911939766), (17.942893219, 8.95))
            Line((17.942893219, 8.95), (-17.942893219, 8.95))
            ThreePointArc((-17.942893219, 8.95), (-18.134234935, 8.911939766), (-18.296446609, 8.803553391))
            Line((-18.296446609, 8.803553391), (-18.803553391, 8.296446609))
            ThreePointArc((-18.803553391, 8.296446609), (-18.911939766, 8.134234935), (-18.95, 7.942893219))
            Line((-18.95, 7.942893219), (-18.95, -7.942893219))
            ThreePointArc((-18.95, -7.942893219), (-18.911939766, -8.134234935), (-18.803553391, -8.296446609))
            Line((-18.803553391, -8.296446609), (-18.296446609, -8.803553391))
            ThreePointArc((-18.296446609, -8.803553391), (-18.134234935, -8.911939766), (-17.942893219, -8.95))
        make_face()
    extrude(amount=EXTRUDE_2_DEPTH)

    # 草图17 → 切除-拉伸5 (cut)
    with BuildSketch(Plane(origin=(0, 8.95, 0), x_dir=(1, 0, 0), z_dir=(0, 1, 0))):
        with Locations((0, -7)):
            Rectangle(SKETCH_17_W, SKETCH_17_H)
    extrude(amount=-CUT_EXTRUDE_5_DEPTH, mode=Mode.SUBTRACT)

    # 圆角2
    fillet_2_edges = [part.edges().sort_by_distance(p)[0] for p in [
        (-10.05, 0, -16),
        (10.05, 0, -16),
    ]]
    fillet(fillet_2_edges, radius=FILLET_2_R - 0.0001)  # a hair under: the kernel refuses the full size
    fillet_2_2_edges = [part.edges().sort_by_distance(p)[0] for p in [
        (10.05, 0, 30),
        (-10.05, 0, 30),
    ]]
    fillet(fillet_2_2_edges, radius=FILLET_2_R)

    # 草图18 → 切除-拉伸6 (cut)
    with BuildSketch(Plane.XZ.offset(8.95)):
        with Locations(Location((-14.5, 19, 0), (0, 0, 270))):
            Circle(SKETCH_18_R)
        with Locations(Location((14.5, 19, 0), (0, 0, 270))):
            Circle(SKETCH_18_R)
    extrude(amount=-CUT_EXTRUDE_6_DEPTH, mode=Mode.SUBTRACT)

    # 圆角4
    # the kernel refuses this fillet: 2 mm, written as the material it takes off along each edge
    with BuildSketch(Plane(origin=(-18.95, -12.942893219, -20), x_dir=(1, 0, 0), z_dir=(0, 1, 0)), Plane(origin=(18.95, 12.942893219, -20), x_dir=(-1, 0, 0), z_dir=(0, -1, 0)), Plane(origin=(18.95, -12.942893219, 30), x_dir=(-1, 0, 0), z_dir=(0, 1, 0)), Plane(origin=(-18.95, 12.942893219, 30), x_dir=(1, 0, 0), z_dir=(0, -1, 0))) as fillet_4_piece_1:
        with BuildLine():
            CenterArc((FILLET_4_R, -FILLET_4_R), FILLET_4_R, 90, 90)
            Line((0, -FILLET_4_R), (0, 0))
            Line((0, 0), (FILLET_4_R, 0))
        make_face()
    extrude(amount=25.885786438, mode=Mode.SUBTRACT)

    # M4 螺纹孔4
    with Locations(Plane(origin=(18.95, 0, 0), x_dir=(0, 0, -1), z_dir=(1, 0, 0))):
        with Locations((-24, 5), (-24, -5)):
            Hole(HOLE_WIZARD_M4_4_D / 2, depth=HOLE_WIZARD_M4_4_DEPTH)
            with Locations((0, 0, -(HOLE_WIZARD_M4_4_DEPTH + HOLE_WIZARD_M4_4_TIP / 2))):  # 118° drill point
                Cone(0, HOLE_WIZARD_M4_4_D / 2, HOLE_WIZARD_M4_4_TIP, mode=Mode.SUBTRACT)


solid = part.part
